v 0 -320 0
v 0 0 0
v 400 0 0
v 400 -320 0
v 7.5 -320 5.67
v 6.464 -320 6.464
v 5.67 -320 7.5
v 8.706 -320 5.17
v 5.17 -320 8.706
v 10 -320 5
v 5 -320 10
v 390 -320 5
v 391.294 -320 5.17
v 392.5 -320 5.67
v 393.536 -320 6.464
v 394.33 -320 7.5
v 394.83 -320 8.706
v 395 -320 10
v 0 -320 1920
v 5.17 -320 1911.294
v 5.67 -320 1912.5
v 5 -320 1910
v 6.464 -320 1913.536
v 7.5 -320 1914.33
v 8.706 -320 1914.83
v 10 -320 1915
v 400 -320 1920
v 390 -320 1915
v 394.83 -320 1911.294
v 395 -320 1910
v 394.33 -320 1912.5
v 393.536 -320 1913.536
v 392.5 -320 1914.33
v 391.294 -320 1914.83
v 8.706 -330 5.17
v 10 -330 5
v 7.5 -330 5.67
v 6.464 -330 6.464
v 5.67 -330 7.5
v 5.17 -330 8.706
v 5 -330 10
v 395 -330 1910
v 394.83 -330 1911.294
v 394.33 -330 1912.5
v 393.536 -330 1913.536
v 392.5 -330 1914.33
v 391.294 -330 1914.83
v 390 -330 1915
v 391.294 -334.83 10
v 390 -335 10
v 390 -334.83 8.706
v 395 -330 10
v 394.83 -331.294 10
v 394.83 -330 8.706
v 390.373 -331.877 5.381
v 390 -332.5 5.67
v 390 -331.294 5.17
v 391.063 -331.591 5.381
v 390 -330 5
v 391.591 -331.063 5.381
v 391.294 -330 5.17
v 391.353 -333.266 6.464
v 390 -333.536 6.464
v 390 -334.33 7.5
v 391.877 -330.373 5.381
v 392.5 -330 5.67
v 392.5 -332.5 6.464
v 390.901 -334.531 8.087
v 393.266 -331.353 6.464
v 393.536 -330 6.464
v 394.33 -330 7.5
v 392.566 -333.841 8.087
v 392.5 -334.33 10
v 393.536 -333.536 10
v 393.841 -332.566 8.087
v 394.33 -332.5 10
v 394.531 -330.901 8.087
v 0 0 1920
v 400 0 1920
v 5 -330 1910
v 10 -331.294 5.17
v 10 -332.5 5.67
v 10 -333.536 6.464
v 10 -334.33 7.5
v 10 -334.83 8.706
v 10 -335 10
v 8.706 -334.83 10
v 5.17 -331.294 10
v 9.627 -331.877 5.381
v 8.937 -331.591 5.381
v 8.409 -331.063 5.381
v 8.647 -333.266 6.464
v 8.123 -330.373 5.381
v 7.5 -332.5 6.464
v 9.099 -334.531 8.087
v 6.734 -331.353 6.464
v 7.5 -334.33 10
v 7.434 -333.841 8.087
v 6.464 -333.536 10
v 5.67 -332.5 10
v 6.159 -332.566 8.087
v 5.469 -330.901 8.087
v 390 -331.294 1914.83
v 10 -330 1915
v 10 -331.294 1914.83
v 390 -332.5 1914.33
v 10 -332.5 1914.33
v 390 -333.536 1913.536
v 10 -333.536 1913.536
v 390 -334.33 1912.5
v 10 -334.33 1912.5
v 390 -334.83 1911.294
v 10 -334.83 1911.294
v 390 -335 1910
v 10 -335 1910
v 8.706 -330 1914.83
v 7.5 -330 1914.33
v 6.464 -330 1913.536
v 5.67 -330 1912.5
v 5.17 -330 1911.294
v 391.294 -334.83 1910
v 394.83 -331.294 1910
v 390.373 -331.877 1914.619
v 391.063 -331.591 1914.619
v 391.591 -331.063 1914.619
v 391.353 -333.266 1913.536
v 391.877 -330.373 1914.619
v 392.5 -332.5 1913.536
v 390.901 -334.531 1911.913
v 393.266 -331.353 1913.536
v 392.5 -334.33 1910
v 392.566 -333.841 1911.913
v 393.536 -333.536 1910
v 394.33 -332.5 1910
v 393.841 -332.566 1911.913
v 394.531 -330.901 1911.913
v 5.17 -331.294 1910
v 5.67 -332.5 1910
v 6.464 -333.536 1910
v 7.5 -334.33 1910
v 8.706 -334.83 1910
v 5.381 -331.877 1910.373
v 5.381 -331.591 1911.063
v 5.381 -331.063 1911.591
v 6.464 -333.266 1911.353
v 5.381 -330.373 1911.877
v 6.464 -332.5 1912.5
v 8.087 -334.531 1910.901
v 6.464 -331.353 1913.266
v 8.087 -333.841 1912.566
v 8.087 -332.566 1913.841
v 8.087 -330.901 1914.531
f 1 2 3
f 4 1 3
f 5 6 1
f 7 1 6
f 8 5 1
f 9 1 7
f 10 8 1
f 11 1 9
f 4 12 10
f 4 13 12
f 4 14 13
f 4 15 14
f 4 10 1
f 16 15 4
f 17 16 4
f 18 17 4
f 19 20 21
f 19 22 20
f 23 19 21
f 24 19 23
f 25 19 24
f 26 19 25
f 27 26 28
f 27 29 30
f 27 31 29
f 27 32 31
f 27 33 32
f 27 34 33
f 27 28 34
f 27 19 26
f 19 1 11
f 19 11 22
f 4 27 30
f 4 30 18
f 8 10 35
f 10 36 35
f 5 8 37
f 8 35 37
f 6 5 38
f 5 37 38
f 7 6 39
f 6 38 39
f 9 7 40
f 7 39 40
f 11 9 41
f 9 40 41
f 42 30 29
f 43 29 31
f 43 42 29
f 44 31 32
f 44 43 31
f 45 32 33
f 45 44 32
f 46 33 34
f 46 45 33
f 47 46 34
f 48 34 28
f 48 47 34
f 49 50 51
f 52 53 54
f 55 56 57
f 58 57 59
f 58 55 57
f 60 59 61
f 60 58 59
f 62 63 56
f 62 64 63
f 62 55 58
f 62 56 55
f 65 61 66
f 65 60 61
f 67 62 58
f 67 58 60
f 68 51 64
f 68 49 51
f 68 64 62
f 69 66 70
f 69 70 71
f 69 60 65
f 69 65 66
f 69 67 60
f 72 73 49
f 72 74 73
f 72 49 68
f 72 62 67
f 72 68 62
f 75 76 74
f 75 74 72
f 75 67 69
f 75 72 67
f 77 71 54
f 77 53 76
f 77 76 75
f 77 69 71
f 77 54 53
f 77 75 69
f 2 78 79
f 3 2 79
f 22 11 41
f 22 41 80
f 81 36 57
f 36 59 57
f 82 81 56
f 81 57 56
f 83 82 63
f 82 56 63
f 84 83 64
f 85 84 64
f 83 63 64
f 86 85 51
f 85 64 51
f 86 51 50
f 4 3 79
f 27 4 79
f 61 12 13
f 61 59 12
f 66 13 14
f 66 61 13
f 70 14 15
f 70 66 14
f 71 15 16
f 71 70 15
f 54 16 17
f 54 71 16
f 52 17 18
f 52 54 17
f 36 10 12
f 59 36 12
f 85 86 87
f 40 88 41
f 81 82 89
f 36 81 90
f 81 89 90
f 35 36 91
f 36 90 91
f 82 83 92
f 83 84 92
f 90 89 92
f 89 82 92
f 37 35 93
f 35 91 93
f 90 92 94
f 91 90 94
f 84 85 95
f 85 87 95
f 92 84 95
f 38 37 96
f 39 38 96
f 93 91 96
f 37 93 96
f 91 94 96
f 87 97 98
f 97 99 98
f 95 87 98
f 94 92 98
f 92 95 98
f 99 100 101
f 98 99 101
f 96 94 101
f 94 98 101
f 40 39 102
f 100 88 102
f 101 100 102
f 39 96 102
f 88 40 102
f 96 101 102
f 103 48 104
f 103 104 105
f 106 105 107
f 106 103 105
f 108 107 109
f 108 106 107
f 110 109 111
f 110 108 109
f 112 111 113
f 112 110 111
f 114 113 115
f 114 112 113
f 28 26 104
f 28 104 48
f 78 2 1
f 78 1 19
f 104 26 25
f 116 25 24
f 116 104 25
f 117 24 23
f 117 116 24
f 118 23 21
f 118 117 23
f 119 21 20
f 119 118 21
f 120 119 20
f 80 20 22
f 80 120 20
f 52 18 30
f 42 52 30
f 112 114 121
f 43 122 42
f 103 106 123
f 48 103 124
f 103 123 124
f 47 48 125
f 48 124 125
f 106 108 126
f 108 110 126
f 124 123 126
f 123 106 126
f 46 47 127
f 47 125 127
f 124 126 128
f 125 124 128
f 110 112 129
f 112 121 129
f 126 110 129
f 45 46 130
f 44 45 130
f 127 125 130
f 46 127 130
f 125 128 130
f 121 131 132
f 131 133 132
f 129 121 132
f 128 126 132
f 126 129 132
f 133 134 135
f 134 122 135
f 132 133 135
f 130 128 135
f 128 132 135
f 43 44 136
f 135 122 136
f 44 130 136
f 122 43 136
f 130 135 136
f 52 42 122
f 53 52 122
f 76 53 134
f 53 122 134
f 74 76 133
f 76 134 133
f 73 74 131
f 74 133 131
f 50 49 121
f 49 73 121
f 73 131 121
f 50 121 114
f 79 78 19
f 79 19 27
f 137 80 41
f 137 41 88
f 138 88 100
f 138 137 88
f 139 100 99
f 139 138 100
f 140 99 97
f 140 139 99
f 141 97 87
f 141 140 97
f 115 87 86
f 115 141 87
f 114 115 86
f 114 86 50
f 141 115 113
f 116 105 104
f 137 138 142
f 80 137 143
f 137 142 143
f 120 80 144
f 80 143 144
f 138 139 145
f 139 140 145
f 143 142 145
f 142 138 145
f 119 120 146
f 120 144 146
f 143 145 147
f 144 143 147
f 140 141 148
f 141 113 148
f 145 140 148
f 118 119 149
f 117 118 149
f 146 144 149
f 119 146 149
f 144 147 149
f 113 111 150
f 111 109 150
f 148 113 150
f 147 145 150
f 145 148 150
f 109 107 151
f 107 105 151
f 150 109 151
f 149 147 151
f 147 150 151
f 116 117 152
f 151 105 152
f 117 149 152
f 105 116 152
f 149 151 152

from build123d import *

# Parameters (mm, degrees)
F0_W     = 400
F0_H     = 1920
F1_DEPTH = 320
F2_W     = 390
F2_H     = 1910
F3_DEPTH = 15
F4_R     = 5


with BuildPart() as f1:
    # F0 (on Front) → F1 (new body)
    with BuildSketch(Plane.XZ):
        with Locations((200, 960)):
            Rectangle(F0_W, F0_H)
    extrude(amount=F1_DEPTH)

    # F2 (on face) → F3 (join)
    with BuildSketch(Plane.XZ.offset(320)):
        with Locations((200, 960)):
            Rectangle(F2_W, F2_H)
    extrude(amount=F3_DEPTH)

    # F4
    f4_edges = [f1.edges().sort_by_distance(p)[0] for p in [
        (395, -335, 960),
        (200, -335, 1915),
        (5, -335, 960),
        (200, -335, 5),
        (395, -327.5, 1915),
        (5, -327.5, 1915),
        (395, -327.5, 5),
        (5, -327.5, 5),
    ]]
    fillet(f4_edges, radius=F4_R)


solid = f1.part
